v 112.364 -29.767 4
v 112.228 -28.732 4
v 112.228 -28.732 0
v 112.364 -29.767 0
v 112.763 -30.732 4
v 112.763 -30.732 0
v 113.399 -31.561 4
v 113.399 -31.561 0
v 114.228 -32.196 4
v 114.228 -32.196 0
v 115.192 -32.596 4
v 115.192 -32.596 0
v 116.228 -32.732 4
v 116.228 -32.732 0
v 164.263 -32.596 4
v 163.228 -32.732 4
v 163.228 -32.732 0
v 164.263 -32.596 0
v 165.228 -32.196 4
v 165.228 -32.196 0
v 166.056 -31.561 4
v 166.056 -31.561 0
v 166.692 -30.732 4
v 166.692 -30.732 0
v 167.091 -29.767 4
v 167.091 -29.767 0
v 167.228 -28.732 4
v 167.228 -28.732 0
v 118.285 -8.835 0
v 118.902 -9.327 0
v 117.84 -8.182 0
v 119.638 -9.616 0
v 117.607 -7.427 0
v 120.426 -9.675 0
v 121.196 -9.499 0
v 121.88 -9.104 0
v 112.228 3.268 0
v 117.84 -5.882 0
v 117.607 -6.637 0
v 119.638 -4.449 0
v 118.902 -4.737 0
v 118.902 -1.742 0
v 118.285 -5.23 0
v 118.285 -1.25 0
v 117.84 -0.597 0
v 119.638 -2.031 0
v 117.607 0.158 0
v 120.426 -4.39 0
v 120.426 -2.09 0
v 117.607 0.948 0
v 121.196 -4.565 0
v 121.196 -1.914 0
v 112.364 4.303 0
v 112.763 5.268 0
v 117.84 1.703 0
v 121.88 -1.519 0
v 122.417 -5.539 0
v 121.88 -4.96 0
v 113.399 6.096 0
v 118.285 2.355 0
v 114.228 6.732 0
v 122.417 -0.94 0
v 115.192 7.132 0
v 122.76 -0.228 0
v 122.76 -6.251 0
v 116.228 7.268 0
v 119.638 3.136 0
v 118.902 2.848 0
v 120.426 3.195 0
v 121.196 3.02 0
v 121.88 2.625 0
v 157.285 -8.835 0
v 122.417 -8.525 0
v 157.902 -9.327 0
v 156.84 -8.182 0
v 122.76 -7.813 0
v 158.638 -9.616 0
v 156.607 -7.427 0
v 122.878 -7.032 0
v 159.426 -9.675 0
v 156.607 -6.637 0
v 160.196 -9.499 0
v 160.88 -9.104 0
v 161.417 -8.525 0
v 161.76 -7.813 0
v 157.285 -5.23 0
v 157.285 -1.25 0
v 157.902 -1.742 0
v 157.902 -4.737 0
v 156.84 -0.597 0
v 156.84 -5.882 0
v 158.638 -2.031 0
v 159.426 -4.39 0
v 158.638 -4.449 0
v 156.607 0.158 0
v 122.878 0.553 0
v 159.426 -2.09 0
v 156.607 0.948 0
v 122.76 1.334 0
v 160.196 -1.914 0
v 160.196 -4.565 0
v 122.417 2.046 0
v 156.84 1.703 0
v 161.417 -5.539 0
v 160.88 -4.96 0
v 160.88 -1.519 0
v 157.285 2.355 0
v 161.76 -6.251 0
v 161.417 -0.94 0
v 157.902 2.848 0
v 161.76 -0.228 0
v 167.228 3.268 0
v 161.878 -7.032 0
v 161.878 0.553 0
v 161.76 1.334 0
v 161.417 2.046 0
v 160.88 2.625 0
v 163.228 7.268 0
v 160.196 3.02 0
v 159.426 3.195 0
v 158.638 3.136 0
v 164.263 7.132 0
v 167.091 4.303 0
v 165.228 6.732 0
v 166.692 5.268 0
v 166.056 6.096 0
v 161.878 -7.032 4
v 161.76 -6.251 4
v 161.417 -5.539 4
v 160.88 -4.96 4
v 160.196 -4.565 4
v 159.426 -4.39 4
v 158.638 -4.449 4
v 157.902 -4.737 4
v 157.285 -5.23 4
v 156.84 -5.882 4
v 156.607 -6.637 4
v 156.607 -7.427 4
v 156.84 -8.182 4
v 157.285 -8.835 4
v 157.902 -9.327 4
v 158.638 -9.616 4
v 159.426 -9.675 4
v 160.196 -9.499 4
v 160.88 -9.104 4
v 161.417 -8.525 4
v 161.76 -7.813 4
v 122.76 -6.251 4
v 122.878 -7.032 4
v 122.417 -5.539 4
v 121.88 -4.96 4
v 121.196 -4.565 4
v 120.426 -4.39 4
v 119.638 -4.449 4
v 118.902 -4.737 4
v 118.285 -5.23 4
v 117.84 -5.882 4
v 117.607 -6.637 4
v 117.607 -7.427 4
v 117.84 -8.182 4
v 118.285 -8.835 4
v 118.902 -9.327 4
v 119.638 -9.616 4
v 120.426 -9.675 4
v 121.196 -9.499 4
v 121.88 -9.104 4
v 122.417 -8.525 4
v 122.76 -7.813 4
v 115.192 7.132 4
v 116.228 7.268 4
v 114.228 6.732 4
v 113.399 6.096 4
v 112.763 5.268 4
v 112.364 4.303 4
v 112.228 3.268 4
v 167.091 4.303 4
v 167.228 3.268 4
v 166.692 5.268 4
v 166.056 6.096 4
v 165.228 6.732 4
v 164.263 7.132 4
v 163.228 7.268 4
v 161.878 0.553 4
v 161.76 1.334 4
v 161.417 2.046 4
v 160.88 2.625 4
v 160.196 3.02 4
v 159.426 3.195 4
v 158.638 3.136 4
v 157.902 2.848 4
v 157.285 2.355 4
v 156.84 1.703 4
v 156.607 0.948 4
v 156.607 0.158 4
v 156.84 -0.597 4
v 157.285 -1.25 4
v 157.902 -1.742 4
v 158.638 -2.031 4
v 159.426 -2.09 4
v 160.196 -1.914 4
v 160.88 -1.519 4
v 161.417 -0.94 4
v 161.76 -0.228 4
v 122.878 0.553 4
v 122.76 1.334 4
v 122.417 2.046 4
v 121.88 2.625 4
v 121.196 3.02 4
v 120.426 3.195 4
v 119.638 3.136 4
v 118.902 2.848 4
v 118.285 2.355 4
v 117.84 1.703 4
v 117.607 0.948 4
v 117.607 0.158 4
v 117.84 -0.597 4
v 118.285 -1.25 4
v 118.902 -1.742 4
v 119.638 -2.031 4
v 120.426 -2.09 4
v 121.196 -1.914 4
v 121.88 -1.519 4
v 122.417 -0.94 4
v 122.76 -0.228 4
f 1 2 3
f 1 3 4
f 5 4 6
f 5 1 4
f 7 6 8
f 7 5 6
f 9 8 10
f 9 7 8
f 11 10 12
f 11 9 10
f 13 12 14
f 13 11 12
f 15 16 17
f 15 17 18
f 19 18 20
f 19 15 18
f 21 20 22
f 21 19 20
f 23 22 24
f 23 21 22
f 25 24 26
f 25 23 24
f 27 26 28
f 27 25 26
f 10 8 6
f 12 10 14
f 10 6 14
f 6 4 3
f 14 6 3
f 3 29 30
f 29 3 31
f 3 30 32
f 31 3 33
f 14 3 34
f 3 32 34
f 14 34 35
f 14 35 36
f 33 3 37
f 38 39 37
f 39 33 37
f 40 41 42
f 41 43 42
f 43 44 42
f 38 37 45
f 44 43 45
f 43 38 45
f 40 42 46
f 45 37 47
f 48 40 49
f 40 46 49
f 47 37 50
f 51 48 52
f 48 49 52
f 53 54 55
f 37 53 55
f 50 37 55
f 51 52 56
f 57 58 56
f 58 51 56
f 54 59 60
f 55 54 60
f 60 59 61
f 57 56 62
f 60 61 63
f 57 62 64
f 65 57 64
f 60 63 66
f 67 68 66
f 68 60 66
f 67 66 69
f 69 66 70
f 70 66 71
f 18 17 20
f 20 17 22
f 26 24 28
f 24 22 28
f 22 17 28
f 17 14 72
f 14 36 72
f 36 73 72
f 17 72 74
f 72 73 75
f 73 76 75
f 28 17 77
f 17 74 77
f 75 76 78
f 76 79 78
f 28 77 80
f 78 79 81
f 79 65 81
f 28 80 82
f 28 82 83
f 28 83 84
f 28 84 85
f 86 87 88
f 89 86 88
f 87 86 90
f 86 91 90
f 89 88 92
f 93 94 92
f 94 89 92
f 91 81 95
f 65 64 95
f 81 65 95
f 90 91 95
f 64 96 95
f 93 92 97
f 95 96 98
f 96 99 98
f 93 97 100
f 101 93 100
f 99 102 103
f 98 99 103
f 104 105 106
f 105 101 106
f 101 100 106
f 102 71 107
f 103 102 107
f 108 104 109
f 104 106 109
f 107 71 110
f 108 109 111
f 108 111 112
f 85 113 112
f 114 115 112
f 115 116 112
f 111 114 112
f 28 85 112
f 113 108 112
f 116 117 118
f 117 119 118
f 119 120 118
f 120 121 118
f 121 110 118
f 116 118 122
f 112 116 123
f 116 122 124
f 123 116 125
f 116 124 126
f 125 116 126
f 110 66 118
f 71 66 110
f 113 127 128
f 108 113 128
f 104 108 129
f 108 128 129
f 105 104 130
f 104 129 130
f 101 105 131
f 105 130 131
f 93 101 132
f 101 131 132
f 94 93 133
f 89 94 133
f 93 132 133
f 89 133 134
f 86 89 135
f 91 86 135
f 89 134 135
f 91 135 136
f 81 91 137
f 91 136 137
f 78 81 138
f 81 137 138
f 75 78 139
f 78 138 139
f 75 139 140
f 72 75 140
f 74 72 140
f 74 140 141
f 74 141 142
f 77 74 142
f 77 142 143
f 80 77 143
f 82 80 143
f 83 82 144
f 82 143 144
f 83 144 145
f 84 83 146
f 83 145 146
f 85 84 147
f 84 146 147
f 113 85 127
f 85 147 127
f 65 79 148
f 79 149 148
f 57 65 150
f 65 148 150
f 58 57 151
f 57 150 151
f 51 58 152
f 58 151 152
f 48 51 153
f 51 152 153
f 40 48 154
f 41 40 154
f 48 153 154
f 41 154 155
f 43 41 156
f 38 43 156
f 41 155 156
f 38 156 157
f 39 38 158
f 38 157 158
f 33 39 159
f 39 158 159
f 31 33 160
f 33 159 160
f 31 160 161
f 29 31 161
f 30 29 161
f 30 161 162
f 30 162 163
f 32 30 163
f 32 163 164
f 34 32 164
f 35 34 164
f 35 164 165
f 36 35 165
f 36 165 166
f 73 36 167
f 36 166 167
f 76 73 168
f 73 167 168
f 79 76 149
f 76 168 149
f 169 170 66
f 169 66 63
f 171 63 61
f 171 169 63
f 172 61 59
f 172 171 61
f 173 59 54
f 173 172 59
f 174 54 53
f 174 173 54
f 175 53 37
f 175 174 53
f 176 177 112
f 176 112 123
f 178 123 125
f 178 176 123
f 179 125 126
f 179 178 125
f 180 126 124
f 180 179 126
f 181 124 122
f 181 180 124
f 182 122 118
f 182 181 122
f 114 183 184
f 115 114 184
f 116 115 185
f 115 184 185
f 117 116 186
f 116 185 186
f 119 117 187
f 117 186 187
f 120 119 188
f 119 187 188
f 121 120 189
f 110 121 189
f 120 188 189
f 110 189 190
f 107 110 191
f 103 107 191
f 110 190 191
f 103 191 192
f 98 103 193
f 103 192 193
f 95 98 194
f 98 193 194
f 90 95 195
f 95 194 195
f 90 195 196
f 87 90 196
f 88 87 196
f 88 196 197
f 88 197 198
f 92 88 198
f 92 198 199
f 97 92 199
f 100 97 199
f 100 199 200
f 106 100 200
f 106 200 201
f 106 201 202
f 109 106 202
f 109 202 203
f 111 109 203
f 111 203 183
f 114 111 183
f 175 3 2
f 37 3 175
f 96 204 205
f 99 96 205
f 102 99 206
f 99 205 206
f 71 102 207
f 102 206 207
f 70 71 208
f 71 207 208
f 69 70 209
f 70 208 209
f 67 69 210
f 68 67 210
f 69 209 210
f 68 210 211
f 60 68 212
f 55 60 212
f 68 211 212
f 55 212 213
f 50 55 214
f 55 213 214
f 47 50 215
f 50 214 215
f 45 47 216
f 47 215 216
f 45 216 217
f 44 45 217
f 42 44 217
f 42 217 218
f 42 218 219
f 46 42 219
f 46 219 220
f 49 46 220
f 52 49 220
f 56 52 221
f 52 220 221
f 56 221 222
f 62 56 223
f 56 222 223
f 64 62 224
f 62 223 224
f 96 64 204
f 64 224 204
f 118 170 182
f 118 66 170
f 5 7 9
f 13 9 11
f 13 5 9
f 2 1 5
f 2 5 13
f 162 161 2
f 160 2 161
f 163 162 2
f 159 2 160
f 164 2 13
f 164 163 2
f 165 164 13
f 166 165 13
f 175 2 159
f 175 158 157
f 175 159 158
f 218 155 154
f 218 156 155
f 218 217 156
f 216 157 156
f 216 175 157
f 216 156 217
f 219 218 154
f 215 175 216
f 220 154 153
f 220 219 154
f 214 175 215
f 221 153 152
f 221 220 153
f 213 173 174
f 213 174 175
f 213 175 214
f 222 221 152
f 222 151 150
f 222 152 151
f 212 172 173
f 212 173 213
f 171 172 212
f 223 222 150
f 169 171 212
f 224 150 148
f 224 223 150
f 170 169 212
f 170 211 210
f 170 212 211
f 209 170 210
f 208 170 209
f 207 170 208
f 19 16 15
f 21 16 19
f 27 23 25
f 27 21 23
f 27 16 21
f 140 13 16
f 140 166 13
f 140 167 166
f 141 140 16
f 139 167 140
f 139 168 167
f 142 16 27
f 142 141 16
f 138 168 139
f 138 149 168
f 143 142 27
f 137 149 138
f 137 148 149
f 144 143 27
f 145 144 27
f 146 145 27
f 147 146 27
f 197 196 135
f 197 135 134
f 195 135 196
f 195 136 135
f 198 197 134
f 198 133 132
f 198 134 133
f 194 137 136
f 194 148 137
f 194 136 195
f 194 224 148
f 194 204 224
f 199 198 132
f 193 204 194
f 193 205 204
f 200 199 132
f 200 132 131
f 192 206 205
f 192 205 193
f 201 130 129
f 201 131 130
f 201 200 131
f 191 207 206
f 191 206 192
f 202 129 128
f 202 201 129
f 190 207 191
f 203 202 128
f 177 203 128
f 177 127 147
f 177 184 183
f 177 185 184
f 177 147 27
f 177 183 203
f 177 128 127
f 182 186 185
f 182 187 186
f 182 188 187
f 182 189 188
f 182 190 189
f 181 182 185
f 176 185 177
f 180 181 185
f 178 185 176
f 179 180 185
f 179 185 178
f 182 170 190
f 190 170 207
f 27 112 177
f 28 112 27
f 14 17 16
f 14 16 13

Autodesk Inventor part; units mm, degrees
ref_plane "YZ Plane" through (0, 0, 0) normal (1, 0, 0) x (0, 1, 0)
ref_plane "XZ Plane" through (0, 0, 0) normal (0, 1, 0) x (-1, 0, 0)
ref_plane "XY Plane" through (0, 0, 0) normal (0, 0, 1) x (1, 0, 0)
sketch "Эскиз1" plane through (0, 0, 0) normal (0, 0, 1) x (1, 0, 0)
  line L0 (112.2275, 7.2678) -> (167.2275, 7.2678)
  line L1 (167.2275, 7.2678) -> (167.2275, -32.7322)
  line L2 (167.2275, -32.7322) -> (112.2275, -32.7322)
  line L3 (112.2275, -32.7322) -> (112.2275, 7.2678)
  line L4 (112.2275, 7.2678) -> (167.2275, -32.7322) construction
  line L5 (167.2275, 7.2678) -> (112.2275, -32.7322) construction
  line L6 (147.2275, -32.7322) -> (167.2275, -32.7322)
  point P0 (139.7275, -12.7322)
  point P1 (139.7275, -32.7322)
  dimension "d55" = 40
  dimension "d67" = 55
extrude "Выдавливание1" add sketch "Эскиз1" along normal blind 4
sketch "Эскиз6" plane through (0, 0, 4) normal (0, 0, 1) x (1, 0, 0)
  line L0 (112.2275, -32.7322) -> (167.2275, -32.7322) construction
  line L1 (167.2275, 7.2678) -> (112.2275, 7.2678) construction
  line L2 (112.2275, 7.2678) -> (112.2275, -32.7322) construction
  circle A0 centre (120.2275, 0.5528) radius 2.65
  line L3 (167.2275, -32.7322) -> (167.2275, 7.2678) projected
  line L4 (112.2275, -32.7322) -> (167.2275, -32.7322) projected
  line L5 (139.7275, -32.7322) -> (139.7275, 7.2678) construction
  circle A1 centre (159.2275, 0.5528) radius 2.65
  line L6 (167.2275, 7.2678) -> (112.2275, 7.2678) projected
  line L7 (112.2275, 7.2678) -> (112.2275, -32.7322) projected
  circle A2 centre (120.2275, -7.0322) radius 2.65
  circle A3 centre (159.2275, -7.0322) radius 2.65
  point P0 (0, 0)
  dimension "d76" = 8
  dimension "d77" = 5.3
  dimension "d78" = 6.715
  dimension "d79" = 5.3
  dimension "d80" = 14.3
extrude "Выдавливание5" cut sketch "Эскиз6" against normal blind 4 contours A0 | A1 | A2 | A3
fillet "Сопряжение5" radius 4 4 edges at (112.2275, -32.7322, 2) (112.2275, 7.2678, 2) (167.2275, 7.2678, 2) (167.2275, -32.7322, 2)
properties part number "креп_центр_рейки"
